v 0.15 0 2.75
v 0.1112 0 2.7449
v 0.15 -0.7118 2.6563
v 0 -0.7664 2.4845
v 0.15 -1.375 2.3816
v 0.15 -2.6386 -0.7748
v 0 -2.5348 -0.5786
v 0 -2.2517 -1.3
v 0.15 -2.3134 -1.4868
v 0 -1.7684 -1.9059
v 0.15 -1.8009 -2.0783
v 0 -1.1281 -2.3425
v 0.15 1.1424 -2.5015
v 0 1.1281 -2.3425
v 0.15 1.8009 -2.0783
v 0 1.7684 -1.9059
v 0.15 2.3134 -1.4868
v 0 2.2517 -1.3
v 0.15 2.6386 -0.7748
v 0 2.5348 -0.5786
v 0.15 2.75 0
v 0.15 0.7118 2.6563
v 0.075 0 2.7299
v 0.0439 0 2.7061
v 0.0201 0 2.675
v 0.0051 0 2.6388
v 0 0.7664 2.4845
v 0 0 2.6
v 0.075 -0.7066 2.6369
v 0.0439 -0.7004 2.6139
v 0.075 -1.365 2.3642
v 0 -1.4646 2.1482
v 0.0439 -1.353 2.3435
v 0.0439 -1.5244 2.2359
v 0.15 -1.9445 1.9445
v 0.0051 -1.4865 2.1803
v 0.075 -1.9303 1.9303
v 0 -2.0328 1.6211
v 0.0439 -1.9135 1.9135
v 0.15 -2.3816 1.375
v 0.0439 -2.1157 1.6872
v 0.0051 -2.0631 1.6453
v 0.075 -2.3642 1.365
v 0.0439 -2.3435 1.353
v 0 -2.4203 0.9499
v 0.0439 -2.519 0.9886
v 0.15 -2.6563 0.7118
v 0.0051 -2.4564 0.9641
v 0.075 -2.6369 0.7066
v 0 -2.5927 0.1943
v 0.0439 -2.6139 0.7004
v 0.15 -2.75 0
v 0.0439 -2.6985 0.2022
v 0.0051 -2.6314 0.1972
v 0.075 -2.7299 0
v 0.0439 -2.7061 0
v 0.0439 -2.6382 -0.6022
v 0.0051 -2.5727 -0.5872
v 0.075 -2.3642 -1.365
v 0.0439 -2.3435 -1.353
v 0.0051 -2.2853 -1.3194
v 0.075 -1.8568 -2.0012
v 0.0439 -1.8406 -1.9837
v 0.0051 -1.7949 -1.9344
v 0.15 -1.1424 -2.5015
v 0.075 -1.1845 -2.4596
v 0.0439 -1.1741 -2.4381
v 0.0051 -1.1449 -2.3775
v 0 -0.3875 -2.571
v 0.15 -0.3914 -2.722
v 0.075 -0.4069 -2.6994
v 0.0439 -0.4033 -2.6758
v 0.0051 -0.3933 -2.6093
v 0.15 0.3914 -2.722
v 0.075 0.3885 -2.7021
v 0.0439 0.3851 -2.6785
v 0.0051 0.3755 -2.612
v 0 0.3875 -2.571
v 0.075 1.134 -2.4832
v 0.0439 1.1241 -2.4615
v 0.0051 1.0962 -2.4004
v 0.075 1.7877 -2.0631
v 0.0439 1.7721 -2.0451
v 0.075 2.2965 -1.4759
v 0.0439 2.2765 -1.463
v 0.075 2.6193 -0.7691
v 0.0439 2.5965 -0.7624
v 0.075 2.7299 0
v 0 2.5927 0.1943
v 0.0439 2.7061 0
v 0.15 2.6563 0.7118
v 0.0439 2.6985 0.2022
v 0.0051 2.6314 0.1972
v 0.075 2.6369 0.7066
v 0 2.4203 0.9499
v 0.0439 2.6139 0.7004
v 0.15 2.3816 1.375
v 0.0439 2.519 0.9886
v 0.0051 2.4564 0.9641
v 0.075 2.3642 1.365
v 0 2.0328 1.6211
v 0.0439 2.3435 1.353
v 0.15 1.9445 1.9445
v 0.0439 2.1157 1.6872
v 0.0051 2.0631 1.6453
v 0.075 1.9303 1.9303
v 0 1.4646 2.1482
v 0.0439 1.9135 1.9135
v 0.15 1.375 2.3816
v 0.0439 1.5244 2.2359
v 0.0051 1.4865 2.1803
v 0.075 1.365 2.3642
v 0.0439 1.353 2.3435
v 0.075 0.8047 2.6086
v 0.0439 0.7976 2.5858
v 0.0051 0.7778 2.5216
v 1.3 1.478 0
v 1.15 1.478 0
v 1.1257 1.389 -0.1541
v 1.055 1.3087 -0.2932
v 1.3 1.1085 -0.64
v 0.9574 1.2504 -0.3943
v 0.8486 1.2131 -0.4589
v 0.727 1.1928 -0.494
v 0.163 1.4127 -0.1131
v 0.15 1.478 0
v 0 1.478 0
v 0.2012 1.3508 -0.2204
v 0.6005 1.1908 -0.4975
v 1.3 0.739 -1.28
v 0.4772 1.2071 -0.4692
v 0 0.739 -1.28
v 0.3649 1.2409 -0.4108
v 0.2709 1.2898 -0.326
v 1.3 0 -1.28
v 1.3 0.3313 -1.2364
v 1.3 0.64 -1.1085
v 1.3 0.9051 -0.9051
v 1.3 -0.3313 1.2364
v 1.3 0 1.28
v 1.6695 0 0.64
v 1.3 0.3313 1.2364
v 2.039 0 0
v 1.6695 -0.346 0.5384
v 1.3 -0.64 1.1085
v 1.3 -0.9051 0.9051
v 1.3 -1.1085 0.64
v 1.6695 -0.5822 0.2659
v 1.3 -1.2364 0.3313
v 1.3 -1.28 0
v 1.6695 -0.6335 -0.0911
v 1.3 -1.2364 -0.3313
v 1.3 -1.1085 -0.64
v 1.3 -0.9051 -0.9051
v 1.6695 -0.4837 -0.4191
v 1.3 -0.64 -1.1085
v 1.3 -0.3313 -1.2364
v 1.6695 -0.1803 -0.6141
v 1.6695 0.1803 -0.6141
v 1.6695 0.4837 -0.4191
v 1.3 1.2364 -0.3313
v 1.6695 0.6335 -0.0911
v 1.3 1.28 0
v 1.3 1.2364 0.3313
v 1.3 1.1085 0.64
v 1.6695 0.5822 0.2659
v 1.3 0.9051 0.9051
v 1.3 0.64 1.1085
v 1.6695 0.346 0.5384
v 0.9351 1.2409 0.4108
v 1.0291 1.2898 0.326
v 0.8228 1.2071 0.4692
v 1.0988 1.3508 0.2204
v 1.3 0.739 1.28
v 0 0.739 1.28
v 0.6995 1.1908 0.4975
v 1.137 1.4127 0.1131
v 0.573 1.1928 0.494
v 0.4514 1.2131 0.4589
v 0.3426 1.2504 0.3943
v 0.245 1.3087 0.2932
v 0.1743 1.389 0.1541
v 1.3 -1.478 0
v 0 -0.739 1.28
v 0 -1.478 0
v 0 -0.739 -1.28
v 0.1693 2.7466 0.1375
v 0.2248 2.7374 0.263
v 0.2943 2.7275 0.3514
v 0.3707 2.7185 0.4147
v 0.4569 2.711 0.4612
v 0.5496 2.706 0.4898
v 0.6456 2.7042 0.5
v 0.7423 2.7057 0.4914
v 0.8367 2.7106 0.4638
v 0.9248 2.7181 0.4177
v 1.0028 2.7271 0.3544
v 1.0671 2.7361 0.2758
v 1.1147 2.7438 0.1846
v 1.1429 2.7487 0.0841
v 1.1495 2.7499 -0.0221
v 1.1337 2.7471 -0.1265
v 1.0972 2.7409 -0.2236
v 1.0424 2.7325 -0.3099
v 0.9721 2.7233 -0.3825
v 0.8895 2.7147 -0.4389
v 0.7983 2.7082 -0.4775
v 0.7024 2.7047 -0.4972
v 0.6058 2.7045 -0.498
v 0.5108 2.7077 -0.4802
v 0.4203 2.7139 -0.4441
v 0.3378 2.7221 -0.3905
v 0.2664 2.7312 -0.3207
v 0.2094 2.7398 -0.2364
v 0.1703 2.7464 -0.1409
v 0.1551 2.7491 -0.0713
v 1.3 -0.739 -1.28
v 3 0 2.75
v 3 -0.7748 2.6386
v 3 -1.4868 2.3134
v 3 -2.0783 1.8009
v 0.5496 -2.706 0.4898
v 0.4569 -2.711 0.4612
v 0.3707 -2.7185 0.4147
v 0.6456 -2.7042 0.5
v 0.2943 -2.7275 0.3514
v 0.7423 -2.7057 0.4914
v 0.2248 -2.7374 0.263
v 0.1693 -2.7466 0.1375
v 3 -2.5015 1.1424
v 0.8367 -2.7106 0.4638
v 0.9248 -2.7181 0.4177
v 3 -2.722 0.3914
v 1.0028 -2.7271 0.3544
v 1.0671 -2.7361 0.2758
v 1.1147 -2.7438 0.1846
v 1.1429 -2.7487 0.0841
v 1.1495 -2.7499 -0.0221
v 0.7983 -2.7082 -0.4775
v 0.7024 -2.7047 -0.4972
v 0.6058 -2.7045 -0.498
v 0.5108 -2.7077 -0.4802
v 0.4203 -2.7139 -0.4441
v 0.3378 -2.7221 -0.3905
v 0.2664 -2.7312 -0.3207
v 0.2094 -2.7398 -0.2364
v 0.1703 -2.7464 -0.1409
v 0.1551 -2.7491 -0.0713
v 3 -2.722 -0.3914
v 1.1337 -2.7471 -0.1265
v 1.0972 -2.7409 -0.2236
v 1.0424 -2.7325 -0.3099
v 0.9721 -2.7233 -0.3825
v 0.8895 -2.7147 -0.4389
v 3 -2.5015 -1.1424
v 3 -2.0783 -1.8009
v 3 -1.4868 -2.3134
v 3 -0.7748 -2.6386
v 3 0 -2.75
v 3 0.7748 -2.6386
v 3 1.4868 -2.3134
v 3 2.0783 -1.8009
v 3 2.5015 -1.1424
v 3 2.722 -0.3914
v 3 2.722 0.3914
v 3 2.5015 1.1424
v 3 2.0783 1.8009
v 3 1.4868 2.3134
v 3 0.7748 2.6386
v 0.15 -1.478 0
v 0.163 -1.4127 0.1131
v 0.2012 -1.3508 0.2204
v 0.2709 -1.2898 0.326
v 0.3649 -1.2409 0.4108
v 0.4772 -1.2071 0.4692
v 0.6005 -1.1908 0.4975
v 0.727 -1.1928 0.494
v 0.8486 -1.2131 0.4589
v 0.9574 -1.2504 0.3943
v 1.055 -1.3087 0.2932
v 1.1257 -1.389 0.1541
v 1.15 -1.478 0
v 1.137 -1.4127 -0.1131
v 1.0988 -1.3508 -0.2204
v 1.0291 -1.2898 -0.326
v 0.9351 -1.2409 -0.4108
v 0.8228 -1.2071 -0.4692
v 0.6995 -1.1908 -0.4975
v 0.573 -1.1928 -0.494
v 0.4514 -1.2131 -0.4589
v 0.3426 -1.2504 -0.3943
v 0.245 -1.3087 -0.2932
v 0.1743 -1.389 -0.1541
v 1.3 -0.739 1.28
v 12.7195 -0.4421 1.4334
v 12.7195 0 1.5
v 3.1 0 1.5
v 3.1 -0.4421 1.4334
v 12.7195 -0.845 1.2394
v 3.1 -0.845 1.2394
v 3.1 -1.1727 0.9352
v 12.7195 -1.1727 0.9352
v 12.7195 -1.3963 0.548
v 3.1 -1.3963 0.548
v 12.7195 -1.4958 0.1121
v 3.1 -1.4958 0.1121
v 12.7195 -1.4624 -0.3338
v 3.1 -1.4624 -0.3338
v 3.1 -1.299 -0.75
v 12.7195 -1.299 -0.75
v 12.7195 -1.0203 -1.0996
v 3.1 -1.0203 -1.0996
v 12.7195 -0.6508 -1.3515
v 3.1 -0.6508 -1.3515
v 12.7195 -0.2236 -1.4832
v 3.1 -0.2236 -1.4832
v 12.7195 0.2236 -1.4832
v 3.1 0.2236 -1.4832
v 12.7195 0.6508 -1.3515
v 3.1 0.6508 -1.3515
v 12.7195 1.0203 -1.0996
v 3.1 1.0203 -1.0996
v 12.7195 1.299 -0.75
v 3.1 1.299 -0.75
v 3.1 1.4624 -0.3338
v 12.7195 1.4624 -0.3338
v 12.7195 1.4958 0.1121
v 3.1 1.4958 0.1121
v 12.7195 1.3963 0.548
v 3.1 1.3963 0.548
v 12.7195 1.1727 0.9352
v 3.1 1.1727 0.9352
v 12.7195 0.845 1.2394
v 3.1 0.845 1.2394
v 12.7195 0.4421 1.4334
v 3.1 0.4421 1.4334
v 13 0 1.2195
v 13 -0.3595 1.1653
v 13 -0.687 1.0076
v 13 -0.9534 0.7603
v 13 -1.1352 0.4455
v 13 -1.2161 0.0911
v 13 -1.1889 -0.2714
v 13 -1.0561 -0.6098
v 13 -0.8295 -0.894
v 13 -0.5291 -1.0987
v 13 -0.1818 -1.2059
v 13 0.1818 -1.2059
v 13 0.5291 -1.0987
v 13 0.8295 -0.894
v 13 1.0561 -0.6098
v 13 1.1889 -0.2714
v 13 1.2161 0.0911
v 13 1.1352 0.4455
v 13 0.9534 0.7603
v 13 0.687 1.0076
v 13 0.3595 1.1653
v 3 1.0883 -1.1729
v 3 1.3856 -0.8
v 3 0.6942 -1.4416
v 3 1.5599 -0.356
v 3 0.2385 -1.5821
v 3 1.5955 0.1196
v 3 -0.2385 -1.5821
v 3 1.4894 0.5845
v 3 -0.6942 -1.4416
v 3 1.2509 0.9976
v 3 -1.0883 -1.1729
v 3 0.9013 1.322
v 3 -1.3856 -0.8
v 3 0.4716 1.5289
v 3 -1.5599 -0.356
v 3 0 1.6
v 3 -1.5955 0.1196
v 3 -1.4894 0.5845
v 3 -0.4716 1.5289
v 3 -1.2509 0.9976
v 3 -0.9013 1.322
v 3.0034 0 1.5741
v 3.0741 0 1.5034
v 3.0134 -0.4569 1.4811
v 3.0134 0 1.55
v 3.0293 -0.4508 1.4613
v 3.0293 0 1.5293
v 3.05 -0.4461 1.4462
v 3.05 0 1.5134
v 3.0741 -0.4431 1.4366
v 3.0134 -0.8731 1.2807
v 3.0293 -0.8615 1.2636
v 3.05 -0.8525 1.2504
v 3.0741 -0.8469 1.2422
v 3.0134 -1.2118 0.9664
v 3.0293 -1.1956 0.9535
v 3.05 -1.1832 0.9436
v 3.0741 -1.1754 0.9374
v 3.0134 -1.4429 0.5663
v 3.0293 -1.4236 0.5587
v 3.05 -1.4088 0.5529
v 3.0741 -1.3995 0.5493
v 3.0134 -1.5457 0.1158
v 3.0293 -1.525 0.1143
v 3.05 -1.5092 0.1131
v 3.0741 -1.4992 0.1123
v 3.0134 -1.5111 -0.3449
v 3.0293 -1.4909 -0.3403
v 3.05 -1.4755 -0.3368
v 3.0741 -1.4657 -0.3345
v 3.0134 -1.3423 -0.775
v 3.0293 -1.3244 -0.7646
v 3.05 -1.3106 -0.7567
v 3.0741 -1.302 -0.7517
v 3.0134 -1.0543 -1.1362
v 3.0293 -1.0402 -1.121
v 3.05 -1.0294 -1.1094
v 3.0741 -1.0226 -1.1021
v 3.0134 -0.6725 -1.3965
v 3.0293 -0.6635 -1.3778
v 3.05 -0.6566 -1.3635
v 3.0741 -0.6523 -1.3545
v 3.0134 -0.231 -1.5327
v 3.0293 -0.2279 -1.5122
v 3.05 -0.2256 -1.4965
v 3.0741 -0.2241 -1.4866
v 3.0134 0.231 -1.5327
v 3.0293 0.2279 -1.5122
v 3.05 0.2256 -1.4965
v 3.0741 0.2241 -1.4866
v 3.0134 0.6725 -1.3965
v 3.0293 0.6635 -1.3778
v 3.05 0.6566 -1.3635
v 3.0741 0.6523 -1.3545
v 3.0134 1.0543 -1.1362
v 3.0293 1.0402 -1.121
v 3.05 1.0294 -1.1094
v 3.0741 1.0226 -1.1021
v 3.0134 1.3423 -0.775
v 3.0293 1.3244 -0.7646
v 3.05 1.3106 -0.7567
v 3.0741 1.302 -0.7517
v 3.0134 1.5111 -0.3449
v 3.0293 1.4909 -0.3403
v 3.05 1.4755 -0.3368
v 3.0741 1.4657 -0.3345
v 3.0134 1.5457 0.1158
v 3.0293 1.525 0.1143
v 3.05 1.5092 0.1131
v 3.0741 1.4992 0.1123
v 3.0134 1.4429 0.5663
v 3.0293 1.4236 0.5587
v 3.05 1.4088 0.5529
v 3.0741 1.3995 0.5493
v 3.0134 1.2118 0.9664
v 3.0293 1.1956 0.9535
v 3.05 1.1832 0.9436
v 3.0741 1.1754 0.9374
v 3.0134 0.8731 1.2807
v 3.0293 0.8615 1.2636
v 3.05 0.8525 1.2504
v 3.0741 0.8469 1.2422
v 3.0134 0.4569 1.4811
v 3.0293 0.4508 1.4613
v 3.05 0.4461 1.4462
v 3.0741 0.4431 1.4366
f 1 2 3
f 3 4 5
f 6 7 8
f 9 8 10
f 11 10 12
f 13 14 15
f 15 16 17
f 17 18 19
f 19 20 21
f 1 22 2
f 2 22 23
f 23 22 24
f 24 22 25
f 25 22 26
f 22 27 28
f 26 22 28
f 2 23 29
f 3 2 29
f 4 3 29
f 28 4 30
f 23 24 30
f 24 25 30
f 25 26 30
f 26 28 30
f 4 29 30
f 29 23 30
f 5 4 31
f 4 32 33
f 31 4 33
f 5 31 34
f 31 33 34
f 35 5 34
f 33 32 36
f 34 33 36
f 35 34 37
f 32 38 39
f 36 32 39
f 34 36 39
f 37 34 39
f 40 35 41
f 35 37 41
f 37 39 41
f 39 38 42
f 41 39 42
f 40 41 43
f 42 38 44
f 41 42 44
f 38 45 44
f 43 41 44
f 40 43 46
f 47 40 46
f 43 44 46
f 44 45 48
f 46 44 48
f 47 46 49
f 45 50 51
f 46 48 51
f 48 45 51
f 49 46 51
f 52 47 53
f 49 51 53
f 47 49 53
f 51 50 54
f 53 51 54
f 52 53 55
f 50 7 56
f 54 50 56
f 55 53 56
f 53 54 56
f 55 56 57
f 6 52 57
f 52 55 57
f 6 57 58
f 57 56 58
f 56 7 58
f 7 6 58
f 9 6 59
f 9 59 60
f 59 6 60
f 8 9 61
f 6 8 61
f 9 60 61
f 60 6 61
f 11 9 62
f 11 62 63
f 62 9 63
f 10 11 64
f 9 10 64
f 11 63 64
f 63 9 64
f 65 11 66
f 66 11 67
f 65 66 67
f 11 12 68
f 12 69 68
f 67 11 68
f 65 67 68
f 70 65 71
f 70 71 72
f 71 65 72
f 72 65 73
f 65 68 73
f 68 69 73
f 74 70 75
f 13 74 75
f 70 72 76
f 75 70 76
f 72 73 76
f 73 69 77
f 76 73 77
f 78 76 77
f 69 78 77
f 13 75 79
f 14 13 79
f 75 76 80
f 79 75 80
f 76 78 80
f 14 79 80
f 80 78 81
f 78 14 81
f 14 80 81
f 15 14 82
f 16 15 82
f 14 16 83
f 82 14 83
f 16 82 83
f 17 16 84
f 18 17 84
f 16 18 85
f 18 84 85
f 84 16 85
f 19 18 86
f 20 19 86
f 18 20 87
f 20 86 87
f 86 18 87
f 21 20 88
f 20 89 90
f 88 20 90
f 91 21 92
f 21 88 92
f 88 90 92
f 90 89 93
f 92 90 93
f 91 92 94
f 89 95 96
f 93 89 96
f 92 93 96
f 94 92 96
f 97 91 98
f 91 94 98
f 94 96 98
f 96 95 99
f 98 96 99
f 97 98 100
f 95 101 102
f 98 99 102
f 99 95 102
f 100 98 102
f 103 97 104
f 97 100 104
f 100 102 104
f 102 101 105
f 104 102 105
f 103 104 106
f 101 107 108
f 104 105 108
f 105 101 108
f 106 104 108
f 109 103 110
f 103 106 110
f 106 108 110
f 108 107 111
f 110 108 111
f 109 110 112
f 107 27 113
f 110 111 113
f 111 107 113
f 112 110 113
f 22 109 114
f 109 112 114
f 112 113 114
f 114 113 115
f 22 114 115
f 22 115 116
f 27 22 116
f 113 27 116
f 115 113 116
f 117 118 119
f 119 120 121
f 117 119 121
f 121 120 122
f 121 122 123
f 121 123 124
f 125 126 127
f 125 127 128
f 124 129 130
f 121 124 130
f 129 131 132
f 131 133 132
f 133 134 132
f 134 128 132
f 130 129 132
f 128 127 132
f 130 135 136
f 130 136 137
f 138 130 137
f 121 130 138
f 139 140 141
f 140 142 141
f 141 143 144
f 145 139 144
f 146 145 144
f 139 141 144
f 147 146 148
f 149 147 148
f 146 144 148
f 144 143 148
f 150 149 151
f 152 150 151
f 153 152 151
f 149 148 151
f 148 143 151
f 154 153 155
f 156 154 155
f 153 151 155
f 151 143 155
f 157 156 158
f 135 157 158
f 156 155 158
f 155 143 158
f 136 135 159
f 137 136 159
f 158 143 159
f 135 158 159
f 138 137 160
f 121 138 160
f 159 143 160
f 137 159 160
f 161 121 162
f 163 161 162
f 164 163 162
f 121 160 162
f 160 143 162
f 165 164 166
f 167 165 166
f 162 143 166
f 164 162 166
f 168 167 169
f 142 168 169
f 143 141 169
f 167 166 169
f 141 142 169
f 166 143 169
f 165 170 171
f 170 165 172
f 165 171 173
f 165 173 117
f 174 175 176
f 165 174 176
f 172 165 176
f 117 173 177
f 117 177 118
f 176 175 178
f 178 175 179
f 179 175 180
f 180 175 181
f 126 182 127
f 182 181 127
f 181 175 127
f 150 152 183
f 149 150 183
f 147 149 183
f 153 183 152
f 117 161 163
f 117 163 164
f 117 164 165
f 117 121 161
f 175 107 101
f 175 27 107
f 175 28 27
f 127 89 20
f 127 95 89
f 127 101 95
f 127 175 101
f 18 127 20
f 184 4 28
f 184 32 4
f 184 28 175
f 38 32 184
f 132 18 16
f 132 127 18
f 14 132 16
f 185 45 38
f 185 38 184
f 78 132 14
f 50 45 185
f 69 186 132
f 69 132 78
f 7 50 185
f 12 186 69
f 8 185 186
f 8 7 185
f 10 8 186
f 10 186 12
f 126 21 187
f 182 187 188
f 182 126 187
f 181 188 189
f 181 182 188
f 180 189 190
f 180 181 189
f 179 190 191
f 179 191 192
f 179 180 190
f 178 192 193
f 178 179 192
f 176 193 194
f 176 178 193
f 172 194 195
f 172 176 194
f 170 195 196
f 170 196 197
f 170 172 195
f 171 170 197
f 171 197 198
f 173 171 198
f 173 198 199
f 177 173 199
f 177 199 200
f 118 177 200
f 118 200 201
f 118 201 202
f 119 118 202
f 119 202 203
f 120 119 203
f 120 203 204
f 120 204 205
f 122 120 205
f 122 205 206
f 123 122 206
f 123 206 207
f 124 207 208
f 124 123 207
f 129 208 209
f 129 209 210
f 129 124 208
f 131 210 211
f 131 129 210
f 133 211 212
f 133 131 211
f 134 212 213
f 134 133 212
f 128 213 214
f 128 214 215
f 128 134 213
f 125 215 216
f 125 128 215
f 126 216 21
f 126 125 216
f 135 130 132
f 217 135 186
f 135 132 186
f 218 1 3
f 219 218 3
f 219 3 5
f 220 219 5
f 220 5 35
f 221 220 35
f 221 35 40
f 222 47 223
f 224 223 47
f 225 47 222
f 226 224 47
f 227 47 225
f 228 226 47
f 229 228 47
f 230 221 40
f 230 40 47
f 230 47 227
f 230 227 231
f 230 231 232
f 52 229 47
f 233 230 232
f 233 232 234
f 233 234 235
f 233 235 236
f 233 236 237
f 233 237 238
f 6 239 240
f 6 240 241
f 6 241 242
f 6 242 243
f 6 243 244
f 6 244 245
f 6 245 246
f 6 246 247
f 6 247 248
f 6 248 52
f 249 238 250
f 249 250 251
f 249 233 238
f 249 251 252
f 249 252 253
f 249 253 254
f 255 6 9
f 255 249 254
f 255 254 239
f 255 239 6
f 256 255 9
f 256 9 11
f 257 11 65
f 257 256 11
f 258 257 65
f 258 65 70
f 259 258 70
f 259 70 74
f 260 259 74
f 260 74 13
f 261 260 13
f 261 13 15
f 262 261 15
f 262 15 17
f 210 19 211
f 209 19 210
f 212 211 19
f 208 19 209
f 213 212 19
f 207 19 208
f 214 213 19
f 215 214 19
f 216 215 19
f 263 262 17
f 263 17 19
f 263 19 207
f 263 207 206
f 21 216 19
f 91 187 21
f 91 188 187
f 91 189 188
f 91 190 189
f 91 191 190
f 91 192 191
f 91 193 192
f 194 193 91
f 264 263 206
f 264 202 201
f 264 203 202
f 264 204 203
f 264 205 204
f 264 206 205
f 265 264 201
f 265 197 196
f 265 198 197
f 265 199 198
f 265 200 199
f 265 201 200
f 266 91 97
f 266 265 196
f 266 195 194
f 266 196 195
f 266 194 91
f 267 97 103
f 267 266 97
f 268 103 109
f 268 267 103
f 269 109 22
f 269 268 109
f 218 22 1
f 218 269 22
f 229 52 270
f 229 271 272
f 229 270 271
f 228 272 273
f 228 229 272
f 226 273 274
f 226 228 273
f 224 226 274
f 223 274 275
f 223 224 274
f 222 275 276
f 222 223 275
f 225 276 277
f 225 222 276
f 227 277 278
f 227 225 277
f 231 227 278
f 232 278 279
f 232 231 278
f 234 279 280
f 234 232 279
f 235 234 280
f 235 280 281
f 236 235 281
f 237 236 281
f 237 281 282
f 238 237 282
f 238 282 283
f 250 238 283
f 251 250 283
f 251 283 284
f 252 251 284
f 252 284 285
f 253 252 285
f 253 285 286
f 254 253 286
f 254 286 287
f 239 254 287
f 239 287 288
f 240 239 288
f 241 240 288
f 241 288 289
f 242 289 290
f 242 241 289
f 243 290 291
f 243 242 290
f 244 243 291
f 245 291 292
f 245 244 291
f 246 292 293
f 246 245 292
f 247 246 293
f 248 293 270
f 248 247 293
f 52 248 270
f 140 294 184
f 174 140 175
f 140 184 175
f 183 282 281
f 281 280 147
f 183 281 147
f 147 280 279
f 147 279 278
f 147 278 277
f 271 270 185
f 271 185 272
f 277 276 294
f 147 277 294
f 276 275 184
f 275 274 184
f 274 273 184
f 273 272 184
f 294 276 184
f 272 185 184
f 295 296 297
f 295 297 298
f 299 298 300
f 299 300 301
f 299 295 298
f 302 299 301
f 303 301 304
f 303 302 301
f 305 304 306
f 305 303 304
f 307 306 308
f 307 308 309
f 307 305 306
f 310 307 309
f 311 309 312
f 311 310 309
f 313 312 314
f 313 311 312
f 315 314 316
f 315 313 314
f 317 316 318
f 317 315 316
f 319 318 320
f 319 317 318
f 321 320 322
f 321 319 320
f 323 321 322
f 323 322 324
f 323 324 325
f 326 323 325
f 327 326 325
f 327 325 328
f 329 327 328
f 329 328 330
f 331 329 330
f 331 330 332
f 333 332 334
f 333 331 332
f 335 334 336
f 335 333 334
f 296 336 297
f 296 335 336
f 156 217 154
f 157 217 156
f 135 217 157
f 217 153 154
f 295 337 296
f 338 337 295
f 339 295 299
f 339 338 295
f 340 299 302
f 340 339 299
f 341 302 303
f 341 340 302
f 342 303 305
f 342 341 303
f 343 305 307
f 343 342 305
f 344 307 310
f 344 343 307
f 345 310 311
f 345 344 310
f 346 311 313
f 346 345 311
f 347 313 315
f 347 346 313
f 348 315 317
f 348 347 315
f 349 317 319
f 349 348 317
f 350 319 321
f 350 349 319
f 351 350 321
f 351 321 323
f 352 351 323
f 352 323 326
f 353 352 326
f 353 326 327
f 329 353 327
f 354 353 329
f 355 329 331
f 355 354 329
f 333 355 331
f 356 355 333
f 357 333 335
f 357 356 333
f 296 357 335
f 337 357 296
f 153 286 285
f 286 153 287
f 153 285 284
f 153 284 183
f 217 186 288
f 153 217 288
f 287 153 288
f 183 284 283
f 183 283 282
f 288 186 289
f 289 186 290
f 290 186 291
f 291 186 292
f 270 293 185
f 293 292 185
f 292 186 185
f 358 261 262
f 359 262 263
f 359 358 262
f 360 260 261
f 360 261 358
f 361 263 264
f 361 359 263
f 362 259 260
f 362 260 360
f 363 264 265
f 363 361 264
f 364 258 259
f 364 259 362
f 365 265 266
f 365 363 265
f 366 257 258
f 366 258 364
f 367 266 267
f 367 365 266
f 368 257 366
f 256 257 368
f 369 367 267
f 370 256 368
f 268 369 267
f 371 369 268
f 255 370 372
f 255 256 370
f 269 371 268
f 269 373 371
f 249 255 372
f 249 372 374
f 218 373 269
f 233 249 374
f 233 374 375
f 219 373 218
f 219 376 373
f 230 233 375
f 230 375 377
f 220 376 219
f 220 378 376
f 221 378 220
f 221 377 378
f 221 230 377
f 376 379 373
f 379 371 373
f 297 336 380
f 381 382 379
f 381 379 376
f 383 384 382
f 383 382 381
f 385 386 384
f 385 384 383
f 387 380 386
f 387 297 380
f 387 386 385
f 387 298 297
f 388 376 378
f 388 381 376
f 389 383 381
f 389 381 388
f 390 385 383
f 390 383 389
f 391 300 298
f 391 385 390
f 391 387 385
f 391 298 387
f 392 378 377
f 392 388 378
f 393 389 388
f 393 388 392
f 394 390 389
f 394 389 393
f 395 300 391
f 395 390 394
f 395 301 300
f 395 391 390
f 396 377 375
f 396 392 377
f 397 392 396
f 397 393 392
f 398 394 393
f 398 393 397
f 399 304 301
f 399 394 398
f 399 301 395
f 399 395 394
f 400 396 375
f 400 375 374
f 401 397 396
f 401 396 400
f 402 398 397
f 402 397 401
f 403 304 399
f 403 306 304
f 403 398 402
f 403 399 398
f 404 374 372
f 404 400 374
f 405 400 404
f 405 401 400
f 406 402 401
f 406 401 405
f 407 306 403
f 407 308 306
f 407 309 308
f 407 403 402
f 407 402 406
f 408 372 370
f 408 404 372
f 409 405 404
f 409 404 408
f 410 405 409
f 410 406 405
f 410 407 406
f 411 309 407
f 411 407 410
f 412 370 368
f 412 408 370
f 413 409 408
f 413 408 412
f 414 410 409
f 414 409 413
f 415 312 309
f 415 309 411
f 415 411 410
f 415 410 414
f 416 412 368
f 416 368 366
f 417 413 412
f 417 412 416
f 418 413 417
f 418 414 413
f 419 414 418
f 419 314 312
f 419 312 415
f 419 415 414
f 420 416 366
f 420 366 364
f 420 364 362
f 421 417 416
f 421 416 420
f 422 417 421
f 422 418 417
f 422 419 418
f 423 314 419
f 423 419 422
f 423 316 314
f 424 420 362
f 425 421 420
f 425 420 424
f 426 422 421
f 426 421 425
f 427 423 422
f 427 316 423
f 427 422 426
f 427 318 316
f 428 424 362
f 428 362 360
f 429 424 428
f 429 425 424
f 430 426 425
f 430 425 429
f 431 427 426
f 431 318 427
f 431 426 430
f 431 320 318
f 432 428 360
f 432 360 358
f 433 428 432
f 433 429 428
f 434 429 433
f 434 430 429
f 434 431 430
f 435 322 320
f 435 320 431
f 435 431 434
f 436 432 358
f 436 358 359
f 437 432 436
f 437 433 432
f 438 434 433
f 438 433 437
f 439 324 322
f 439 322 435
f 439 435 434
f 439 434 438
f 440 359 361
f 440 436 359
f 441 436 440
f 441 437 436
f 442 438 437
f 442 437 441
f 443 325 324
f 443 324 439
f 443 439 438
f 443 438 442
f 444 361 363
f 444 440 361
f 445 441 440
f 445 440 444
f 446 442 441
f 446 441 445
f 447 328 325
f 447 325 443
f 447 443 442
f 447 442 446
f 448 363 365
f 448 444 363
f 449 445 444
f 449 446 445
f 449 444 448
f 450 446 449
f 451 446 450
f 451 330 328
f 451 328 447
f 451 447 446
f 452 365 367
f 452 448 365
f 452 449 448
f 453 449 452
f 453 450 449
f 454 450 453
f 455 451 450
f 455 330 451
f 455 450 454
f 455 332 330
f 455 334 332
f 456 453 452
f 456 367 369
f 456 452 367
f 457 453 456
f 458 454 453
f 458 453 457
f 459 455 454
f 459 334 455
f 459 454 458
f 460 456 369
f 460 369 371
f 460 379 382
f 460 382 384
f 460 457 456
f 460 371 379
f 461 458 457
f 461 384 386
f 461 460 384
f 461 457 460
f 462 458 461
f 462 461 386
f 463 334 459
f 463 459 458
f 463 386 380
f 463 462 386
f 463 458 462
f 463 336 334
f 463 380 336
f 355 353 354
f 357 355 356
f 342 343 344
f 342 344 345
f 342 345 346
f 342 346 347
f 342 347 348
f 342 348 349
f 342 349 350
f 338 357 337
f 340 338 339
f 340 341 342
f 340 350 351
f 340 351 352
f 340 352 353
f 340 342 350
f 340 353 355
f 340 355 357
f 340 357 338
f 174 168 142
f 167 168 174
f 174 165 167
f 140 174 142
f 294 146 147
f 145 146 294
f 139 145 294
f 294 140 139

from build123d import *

# Parameters (mm, degrees)
FILLET1_R               = 0.1
FILLET2_R               = 0.15
HEX_2_DEPTH             = 1.3
CUT_EXTRUDE1_DEPTH      = 14.569266765
CUT_EXTRUDE1_DEPTH_BACK = 14.569266765
SKETCH4_R               = 0.5


with BuildPart() as part:
    # BodySke → Base-Revolve (revolve)
    with BuildSketch(Plane.XY, mode=Mode.PRIVATE) as base_revolve_sk:
        Polygon((0, 0), (0, 2.75), (3, 2.75), (3, 1.5), (12.7195, 1.5), (13, 1.2195), (13, 0), align=None)
    revolve(base_revolve_sk.sketch.rotate(Axis((-31.75, 0, 0), (1, 0, 0)), 90), axis=Axis((-31.75, 0, 0), (1, 0, 0)))

    # Fillet1
    fillet1_edges = [part.edges().sort_by_distance(p)[0] for p in [
        (3, 0, -1.5),
    ]]
    fillet(fillet1_edges, radius=FILLET1_R)

    # Fillet2
    fillet2_edges = [part.edges().sort_by_distance(p)[0] for p in [
        (0, 0, -2.75),
    ]]
    fillet(fillet2_edges, radius=FILLET2_R)

    # Sketch2 → Hex-PreBroach (revolve, cut)
    with BuildSketch(Plane.XY, mode=Mode.PRIVATE) as hex_prebroach_sk:
        Polygon((0, 1.28), (1.3, 1.28), (2.039008345, 0), (0, 0), align=None)
    revolve(hex_prebroach_sk.sketch.rotate(Axis((0, 0, 0), (1, 0, 0)), 90), axis=Axis((0, 0, 0), (1, 0, 0)), mode=Mode.SUBTRACT)

    # Sketch3 → Hex 2 (cut)
    with BuildSketch(Plane(origin=(0, 0, 0), x_dir=(0, 0.500000000000001, 0.866025403784438), z_dir=(-1, 0, 0))):
        Polygon((0.739008345, 1.28), (-0.739008345, 1.28), (-1.478016689, 0), (-0.739008345, -1.28), (0.739008345, -1.28), (1.478016689, 0), align=None)
    extrude(amount=-HEX_2_DEPTH, mode=Mode.SUBTRACT)

    # Sketch4 → Cut-Extrude1 (cut, two sides: drawn at the far end of the back side and taken through both)
    with BuildSketch(Plane(origin=(0, 0, 0), x_dir=(1, 0, 0), z_dir=(0, 1, 0)).offset(-CUT_EXTRUDE1_DEPTH_BACK)):
        with Locations(Location((0.65, 0, 0), (0, 0, 180))):
            Circle(SKETCH4_R)
    extrude(amount=CUT_EXTRUDE1_DEPTH + CUT_EXTRUDE1_DEPTH_BACK, mode=Mode.SUBTRACT)


solid = part.part
